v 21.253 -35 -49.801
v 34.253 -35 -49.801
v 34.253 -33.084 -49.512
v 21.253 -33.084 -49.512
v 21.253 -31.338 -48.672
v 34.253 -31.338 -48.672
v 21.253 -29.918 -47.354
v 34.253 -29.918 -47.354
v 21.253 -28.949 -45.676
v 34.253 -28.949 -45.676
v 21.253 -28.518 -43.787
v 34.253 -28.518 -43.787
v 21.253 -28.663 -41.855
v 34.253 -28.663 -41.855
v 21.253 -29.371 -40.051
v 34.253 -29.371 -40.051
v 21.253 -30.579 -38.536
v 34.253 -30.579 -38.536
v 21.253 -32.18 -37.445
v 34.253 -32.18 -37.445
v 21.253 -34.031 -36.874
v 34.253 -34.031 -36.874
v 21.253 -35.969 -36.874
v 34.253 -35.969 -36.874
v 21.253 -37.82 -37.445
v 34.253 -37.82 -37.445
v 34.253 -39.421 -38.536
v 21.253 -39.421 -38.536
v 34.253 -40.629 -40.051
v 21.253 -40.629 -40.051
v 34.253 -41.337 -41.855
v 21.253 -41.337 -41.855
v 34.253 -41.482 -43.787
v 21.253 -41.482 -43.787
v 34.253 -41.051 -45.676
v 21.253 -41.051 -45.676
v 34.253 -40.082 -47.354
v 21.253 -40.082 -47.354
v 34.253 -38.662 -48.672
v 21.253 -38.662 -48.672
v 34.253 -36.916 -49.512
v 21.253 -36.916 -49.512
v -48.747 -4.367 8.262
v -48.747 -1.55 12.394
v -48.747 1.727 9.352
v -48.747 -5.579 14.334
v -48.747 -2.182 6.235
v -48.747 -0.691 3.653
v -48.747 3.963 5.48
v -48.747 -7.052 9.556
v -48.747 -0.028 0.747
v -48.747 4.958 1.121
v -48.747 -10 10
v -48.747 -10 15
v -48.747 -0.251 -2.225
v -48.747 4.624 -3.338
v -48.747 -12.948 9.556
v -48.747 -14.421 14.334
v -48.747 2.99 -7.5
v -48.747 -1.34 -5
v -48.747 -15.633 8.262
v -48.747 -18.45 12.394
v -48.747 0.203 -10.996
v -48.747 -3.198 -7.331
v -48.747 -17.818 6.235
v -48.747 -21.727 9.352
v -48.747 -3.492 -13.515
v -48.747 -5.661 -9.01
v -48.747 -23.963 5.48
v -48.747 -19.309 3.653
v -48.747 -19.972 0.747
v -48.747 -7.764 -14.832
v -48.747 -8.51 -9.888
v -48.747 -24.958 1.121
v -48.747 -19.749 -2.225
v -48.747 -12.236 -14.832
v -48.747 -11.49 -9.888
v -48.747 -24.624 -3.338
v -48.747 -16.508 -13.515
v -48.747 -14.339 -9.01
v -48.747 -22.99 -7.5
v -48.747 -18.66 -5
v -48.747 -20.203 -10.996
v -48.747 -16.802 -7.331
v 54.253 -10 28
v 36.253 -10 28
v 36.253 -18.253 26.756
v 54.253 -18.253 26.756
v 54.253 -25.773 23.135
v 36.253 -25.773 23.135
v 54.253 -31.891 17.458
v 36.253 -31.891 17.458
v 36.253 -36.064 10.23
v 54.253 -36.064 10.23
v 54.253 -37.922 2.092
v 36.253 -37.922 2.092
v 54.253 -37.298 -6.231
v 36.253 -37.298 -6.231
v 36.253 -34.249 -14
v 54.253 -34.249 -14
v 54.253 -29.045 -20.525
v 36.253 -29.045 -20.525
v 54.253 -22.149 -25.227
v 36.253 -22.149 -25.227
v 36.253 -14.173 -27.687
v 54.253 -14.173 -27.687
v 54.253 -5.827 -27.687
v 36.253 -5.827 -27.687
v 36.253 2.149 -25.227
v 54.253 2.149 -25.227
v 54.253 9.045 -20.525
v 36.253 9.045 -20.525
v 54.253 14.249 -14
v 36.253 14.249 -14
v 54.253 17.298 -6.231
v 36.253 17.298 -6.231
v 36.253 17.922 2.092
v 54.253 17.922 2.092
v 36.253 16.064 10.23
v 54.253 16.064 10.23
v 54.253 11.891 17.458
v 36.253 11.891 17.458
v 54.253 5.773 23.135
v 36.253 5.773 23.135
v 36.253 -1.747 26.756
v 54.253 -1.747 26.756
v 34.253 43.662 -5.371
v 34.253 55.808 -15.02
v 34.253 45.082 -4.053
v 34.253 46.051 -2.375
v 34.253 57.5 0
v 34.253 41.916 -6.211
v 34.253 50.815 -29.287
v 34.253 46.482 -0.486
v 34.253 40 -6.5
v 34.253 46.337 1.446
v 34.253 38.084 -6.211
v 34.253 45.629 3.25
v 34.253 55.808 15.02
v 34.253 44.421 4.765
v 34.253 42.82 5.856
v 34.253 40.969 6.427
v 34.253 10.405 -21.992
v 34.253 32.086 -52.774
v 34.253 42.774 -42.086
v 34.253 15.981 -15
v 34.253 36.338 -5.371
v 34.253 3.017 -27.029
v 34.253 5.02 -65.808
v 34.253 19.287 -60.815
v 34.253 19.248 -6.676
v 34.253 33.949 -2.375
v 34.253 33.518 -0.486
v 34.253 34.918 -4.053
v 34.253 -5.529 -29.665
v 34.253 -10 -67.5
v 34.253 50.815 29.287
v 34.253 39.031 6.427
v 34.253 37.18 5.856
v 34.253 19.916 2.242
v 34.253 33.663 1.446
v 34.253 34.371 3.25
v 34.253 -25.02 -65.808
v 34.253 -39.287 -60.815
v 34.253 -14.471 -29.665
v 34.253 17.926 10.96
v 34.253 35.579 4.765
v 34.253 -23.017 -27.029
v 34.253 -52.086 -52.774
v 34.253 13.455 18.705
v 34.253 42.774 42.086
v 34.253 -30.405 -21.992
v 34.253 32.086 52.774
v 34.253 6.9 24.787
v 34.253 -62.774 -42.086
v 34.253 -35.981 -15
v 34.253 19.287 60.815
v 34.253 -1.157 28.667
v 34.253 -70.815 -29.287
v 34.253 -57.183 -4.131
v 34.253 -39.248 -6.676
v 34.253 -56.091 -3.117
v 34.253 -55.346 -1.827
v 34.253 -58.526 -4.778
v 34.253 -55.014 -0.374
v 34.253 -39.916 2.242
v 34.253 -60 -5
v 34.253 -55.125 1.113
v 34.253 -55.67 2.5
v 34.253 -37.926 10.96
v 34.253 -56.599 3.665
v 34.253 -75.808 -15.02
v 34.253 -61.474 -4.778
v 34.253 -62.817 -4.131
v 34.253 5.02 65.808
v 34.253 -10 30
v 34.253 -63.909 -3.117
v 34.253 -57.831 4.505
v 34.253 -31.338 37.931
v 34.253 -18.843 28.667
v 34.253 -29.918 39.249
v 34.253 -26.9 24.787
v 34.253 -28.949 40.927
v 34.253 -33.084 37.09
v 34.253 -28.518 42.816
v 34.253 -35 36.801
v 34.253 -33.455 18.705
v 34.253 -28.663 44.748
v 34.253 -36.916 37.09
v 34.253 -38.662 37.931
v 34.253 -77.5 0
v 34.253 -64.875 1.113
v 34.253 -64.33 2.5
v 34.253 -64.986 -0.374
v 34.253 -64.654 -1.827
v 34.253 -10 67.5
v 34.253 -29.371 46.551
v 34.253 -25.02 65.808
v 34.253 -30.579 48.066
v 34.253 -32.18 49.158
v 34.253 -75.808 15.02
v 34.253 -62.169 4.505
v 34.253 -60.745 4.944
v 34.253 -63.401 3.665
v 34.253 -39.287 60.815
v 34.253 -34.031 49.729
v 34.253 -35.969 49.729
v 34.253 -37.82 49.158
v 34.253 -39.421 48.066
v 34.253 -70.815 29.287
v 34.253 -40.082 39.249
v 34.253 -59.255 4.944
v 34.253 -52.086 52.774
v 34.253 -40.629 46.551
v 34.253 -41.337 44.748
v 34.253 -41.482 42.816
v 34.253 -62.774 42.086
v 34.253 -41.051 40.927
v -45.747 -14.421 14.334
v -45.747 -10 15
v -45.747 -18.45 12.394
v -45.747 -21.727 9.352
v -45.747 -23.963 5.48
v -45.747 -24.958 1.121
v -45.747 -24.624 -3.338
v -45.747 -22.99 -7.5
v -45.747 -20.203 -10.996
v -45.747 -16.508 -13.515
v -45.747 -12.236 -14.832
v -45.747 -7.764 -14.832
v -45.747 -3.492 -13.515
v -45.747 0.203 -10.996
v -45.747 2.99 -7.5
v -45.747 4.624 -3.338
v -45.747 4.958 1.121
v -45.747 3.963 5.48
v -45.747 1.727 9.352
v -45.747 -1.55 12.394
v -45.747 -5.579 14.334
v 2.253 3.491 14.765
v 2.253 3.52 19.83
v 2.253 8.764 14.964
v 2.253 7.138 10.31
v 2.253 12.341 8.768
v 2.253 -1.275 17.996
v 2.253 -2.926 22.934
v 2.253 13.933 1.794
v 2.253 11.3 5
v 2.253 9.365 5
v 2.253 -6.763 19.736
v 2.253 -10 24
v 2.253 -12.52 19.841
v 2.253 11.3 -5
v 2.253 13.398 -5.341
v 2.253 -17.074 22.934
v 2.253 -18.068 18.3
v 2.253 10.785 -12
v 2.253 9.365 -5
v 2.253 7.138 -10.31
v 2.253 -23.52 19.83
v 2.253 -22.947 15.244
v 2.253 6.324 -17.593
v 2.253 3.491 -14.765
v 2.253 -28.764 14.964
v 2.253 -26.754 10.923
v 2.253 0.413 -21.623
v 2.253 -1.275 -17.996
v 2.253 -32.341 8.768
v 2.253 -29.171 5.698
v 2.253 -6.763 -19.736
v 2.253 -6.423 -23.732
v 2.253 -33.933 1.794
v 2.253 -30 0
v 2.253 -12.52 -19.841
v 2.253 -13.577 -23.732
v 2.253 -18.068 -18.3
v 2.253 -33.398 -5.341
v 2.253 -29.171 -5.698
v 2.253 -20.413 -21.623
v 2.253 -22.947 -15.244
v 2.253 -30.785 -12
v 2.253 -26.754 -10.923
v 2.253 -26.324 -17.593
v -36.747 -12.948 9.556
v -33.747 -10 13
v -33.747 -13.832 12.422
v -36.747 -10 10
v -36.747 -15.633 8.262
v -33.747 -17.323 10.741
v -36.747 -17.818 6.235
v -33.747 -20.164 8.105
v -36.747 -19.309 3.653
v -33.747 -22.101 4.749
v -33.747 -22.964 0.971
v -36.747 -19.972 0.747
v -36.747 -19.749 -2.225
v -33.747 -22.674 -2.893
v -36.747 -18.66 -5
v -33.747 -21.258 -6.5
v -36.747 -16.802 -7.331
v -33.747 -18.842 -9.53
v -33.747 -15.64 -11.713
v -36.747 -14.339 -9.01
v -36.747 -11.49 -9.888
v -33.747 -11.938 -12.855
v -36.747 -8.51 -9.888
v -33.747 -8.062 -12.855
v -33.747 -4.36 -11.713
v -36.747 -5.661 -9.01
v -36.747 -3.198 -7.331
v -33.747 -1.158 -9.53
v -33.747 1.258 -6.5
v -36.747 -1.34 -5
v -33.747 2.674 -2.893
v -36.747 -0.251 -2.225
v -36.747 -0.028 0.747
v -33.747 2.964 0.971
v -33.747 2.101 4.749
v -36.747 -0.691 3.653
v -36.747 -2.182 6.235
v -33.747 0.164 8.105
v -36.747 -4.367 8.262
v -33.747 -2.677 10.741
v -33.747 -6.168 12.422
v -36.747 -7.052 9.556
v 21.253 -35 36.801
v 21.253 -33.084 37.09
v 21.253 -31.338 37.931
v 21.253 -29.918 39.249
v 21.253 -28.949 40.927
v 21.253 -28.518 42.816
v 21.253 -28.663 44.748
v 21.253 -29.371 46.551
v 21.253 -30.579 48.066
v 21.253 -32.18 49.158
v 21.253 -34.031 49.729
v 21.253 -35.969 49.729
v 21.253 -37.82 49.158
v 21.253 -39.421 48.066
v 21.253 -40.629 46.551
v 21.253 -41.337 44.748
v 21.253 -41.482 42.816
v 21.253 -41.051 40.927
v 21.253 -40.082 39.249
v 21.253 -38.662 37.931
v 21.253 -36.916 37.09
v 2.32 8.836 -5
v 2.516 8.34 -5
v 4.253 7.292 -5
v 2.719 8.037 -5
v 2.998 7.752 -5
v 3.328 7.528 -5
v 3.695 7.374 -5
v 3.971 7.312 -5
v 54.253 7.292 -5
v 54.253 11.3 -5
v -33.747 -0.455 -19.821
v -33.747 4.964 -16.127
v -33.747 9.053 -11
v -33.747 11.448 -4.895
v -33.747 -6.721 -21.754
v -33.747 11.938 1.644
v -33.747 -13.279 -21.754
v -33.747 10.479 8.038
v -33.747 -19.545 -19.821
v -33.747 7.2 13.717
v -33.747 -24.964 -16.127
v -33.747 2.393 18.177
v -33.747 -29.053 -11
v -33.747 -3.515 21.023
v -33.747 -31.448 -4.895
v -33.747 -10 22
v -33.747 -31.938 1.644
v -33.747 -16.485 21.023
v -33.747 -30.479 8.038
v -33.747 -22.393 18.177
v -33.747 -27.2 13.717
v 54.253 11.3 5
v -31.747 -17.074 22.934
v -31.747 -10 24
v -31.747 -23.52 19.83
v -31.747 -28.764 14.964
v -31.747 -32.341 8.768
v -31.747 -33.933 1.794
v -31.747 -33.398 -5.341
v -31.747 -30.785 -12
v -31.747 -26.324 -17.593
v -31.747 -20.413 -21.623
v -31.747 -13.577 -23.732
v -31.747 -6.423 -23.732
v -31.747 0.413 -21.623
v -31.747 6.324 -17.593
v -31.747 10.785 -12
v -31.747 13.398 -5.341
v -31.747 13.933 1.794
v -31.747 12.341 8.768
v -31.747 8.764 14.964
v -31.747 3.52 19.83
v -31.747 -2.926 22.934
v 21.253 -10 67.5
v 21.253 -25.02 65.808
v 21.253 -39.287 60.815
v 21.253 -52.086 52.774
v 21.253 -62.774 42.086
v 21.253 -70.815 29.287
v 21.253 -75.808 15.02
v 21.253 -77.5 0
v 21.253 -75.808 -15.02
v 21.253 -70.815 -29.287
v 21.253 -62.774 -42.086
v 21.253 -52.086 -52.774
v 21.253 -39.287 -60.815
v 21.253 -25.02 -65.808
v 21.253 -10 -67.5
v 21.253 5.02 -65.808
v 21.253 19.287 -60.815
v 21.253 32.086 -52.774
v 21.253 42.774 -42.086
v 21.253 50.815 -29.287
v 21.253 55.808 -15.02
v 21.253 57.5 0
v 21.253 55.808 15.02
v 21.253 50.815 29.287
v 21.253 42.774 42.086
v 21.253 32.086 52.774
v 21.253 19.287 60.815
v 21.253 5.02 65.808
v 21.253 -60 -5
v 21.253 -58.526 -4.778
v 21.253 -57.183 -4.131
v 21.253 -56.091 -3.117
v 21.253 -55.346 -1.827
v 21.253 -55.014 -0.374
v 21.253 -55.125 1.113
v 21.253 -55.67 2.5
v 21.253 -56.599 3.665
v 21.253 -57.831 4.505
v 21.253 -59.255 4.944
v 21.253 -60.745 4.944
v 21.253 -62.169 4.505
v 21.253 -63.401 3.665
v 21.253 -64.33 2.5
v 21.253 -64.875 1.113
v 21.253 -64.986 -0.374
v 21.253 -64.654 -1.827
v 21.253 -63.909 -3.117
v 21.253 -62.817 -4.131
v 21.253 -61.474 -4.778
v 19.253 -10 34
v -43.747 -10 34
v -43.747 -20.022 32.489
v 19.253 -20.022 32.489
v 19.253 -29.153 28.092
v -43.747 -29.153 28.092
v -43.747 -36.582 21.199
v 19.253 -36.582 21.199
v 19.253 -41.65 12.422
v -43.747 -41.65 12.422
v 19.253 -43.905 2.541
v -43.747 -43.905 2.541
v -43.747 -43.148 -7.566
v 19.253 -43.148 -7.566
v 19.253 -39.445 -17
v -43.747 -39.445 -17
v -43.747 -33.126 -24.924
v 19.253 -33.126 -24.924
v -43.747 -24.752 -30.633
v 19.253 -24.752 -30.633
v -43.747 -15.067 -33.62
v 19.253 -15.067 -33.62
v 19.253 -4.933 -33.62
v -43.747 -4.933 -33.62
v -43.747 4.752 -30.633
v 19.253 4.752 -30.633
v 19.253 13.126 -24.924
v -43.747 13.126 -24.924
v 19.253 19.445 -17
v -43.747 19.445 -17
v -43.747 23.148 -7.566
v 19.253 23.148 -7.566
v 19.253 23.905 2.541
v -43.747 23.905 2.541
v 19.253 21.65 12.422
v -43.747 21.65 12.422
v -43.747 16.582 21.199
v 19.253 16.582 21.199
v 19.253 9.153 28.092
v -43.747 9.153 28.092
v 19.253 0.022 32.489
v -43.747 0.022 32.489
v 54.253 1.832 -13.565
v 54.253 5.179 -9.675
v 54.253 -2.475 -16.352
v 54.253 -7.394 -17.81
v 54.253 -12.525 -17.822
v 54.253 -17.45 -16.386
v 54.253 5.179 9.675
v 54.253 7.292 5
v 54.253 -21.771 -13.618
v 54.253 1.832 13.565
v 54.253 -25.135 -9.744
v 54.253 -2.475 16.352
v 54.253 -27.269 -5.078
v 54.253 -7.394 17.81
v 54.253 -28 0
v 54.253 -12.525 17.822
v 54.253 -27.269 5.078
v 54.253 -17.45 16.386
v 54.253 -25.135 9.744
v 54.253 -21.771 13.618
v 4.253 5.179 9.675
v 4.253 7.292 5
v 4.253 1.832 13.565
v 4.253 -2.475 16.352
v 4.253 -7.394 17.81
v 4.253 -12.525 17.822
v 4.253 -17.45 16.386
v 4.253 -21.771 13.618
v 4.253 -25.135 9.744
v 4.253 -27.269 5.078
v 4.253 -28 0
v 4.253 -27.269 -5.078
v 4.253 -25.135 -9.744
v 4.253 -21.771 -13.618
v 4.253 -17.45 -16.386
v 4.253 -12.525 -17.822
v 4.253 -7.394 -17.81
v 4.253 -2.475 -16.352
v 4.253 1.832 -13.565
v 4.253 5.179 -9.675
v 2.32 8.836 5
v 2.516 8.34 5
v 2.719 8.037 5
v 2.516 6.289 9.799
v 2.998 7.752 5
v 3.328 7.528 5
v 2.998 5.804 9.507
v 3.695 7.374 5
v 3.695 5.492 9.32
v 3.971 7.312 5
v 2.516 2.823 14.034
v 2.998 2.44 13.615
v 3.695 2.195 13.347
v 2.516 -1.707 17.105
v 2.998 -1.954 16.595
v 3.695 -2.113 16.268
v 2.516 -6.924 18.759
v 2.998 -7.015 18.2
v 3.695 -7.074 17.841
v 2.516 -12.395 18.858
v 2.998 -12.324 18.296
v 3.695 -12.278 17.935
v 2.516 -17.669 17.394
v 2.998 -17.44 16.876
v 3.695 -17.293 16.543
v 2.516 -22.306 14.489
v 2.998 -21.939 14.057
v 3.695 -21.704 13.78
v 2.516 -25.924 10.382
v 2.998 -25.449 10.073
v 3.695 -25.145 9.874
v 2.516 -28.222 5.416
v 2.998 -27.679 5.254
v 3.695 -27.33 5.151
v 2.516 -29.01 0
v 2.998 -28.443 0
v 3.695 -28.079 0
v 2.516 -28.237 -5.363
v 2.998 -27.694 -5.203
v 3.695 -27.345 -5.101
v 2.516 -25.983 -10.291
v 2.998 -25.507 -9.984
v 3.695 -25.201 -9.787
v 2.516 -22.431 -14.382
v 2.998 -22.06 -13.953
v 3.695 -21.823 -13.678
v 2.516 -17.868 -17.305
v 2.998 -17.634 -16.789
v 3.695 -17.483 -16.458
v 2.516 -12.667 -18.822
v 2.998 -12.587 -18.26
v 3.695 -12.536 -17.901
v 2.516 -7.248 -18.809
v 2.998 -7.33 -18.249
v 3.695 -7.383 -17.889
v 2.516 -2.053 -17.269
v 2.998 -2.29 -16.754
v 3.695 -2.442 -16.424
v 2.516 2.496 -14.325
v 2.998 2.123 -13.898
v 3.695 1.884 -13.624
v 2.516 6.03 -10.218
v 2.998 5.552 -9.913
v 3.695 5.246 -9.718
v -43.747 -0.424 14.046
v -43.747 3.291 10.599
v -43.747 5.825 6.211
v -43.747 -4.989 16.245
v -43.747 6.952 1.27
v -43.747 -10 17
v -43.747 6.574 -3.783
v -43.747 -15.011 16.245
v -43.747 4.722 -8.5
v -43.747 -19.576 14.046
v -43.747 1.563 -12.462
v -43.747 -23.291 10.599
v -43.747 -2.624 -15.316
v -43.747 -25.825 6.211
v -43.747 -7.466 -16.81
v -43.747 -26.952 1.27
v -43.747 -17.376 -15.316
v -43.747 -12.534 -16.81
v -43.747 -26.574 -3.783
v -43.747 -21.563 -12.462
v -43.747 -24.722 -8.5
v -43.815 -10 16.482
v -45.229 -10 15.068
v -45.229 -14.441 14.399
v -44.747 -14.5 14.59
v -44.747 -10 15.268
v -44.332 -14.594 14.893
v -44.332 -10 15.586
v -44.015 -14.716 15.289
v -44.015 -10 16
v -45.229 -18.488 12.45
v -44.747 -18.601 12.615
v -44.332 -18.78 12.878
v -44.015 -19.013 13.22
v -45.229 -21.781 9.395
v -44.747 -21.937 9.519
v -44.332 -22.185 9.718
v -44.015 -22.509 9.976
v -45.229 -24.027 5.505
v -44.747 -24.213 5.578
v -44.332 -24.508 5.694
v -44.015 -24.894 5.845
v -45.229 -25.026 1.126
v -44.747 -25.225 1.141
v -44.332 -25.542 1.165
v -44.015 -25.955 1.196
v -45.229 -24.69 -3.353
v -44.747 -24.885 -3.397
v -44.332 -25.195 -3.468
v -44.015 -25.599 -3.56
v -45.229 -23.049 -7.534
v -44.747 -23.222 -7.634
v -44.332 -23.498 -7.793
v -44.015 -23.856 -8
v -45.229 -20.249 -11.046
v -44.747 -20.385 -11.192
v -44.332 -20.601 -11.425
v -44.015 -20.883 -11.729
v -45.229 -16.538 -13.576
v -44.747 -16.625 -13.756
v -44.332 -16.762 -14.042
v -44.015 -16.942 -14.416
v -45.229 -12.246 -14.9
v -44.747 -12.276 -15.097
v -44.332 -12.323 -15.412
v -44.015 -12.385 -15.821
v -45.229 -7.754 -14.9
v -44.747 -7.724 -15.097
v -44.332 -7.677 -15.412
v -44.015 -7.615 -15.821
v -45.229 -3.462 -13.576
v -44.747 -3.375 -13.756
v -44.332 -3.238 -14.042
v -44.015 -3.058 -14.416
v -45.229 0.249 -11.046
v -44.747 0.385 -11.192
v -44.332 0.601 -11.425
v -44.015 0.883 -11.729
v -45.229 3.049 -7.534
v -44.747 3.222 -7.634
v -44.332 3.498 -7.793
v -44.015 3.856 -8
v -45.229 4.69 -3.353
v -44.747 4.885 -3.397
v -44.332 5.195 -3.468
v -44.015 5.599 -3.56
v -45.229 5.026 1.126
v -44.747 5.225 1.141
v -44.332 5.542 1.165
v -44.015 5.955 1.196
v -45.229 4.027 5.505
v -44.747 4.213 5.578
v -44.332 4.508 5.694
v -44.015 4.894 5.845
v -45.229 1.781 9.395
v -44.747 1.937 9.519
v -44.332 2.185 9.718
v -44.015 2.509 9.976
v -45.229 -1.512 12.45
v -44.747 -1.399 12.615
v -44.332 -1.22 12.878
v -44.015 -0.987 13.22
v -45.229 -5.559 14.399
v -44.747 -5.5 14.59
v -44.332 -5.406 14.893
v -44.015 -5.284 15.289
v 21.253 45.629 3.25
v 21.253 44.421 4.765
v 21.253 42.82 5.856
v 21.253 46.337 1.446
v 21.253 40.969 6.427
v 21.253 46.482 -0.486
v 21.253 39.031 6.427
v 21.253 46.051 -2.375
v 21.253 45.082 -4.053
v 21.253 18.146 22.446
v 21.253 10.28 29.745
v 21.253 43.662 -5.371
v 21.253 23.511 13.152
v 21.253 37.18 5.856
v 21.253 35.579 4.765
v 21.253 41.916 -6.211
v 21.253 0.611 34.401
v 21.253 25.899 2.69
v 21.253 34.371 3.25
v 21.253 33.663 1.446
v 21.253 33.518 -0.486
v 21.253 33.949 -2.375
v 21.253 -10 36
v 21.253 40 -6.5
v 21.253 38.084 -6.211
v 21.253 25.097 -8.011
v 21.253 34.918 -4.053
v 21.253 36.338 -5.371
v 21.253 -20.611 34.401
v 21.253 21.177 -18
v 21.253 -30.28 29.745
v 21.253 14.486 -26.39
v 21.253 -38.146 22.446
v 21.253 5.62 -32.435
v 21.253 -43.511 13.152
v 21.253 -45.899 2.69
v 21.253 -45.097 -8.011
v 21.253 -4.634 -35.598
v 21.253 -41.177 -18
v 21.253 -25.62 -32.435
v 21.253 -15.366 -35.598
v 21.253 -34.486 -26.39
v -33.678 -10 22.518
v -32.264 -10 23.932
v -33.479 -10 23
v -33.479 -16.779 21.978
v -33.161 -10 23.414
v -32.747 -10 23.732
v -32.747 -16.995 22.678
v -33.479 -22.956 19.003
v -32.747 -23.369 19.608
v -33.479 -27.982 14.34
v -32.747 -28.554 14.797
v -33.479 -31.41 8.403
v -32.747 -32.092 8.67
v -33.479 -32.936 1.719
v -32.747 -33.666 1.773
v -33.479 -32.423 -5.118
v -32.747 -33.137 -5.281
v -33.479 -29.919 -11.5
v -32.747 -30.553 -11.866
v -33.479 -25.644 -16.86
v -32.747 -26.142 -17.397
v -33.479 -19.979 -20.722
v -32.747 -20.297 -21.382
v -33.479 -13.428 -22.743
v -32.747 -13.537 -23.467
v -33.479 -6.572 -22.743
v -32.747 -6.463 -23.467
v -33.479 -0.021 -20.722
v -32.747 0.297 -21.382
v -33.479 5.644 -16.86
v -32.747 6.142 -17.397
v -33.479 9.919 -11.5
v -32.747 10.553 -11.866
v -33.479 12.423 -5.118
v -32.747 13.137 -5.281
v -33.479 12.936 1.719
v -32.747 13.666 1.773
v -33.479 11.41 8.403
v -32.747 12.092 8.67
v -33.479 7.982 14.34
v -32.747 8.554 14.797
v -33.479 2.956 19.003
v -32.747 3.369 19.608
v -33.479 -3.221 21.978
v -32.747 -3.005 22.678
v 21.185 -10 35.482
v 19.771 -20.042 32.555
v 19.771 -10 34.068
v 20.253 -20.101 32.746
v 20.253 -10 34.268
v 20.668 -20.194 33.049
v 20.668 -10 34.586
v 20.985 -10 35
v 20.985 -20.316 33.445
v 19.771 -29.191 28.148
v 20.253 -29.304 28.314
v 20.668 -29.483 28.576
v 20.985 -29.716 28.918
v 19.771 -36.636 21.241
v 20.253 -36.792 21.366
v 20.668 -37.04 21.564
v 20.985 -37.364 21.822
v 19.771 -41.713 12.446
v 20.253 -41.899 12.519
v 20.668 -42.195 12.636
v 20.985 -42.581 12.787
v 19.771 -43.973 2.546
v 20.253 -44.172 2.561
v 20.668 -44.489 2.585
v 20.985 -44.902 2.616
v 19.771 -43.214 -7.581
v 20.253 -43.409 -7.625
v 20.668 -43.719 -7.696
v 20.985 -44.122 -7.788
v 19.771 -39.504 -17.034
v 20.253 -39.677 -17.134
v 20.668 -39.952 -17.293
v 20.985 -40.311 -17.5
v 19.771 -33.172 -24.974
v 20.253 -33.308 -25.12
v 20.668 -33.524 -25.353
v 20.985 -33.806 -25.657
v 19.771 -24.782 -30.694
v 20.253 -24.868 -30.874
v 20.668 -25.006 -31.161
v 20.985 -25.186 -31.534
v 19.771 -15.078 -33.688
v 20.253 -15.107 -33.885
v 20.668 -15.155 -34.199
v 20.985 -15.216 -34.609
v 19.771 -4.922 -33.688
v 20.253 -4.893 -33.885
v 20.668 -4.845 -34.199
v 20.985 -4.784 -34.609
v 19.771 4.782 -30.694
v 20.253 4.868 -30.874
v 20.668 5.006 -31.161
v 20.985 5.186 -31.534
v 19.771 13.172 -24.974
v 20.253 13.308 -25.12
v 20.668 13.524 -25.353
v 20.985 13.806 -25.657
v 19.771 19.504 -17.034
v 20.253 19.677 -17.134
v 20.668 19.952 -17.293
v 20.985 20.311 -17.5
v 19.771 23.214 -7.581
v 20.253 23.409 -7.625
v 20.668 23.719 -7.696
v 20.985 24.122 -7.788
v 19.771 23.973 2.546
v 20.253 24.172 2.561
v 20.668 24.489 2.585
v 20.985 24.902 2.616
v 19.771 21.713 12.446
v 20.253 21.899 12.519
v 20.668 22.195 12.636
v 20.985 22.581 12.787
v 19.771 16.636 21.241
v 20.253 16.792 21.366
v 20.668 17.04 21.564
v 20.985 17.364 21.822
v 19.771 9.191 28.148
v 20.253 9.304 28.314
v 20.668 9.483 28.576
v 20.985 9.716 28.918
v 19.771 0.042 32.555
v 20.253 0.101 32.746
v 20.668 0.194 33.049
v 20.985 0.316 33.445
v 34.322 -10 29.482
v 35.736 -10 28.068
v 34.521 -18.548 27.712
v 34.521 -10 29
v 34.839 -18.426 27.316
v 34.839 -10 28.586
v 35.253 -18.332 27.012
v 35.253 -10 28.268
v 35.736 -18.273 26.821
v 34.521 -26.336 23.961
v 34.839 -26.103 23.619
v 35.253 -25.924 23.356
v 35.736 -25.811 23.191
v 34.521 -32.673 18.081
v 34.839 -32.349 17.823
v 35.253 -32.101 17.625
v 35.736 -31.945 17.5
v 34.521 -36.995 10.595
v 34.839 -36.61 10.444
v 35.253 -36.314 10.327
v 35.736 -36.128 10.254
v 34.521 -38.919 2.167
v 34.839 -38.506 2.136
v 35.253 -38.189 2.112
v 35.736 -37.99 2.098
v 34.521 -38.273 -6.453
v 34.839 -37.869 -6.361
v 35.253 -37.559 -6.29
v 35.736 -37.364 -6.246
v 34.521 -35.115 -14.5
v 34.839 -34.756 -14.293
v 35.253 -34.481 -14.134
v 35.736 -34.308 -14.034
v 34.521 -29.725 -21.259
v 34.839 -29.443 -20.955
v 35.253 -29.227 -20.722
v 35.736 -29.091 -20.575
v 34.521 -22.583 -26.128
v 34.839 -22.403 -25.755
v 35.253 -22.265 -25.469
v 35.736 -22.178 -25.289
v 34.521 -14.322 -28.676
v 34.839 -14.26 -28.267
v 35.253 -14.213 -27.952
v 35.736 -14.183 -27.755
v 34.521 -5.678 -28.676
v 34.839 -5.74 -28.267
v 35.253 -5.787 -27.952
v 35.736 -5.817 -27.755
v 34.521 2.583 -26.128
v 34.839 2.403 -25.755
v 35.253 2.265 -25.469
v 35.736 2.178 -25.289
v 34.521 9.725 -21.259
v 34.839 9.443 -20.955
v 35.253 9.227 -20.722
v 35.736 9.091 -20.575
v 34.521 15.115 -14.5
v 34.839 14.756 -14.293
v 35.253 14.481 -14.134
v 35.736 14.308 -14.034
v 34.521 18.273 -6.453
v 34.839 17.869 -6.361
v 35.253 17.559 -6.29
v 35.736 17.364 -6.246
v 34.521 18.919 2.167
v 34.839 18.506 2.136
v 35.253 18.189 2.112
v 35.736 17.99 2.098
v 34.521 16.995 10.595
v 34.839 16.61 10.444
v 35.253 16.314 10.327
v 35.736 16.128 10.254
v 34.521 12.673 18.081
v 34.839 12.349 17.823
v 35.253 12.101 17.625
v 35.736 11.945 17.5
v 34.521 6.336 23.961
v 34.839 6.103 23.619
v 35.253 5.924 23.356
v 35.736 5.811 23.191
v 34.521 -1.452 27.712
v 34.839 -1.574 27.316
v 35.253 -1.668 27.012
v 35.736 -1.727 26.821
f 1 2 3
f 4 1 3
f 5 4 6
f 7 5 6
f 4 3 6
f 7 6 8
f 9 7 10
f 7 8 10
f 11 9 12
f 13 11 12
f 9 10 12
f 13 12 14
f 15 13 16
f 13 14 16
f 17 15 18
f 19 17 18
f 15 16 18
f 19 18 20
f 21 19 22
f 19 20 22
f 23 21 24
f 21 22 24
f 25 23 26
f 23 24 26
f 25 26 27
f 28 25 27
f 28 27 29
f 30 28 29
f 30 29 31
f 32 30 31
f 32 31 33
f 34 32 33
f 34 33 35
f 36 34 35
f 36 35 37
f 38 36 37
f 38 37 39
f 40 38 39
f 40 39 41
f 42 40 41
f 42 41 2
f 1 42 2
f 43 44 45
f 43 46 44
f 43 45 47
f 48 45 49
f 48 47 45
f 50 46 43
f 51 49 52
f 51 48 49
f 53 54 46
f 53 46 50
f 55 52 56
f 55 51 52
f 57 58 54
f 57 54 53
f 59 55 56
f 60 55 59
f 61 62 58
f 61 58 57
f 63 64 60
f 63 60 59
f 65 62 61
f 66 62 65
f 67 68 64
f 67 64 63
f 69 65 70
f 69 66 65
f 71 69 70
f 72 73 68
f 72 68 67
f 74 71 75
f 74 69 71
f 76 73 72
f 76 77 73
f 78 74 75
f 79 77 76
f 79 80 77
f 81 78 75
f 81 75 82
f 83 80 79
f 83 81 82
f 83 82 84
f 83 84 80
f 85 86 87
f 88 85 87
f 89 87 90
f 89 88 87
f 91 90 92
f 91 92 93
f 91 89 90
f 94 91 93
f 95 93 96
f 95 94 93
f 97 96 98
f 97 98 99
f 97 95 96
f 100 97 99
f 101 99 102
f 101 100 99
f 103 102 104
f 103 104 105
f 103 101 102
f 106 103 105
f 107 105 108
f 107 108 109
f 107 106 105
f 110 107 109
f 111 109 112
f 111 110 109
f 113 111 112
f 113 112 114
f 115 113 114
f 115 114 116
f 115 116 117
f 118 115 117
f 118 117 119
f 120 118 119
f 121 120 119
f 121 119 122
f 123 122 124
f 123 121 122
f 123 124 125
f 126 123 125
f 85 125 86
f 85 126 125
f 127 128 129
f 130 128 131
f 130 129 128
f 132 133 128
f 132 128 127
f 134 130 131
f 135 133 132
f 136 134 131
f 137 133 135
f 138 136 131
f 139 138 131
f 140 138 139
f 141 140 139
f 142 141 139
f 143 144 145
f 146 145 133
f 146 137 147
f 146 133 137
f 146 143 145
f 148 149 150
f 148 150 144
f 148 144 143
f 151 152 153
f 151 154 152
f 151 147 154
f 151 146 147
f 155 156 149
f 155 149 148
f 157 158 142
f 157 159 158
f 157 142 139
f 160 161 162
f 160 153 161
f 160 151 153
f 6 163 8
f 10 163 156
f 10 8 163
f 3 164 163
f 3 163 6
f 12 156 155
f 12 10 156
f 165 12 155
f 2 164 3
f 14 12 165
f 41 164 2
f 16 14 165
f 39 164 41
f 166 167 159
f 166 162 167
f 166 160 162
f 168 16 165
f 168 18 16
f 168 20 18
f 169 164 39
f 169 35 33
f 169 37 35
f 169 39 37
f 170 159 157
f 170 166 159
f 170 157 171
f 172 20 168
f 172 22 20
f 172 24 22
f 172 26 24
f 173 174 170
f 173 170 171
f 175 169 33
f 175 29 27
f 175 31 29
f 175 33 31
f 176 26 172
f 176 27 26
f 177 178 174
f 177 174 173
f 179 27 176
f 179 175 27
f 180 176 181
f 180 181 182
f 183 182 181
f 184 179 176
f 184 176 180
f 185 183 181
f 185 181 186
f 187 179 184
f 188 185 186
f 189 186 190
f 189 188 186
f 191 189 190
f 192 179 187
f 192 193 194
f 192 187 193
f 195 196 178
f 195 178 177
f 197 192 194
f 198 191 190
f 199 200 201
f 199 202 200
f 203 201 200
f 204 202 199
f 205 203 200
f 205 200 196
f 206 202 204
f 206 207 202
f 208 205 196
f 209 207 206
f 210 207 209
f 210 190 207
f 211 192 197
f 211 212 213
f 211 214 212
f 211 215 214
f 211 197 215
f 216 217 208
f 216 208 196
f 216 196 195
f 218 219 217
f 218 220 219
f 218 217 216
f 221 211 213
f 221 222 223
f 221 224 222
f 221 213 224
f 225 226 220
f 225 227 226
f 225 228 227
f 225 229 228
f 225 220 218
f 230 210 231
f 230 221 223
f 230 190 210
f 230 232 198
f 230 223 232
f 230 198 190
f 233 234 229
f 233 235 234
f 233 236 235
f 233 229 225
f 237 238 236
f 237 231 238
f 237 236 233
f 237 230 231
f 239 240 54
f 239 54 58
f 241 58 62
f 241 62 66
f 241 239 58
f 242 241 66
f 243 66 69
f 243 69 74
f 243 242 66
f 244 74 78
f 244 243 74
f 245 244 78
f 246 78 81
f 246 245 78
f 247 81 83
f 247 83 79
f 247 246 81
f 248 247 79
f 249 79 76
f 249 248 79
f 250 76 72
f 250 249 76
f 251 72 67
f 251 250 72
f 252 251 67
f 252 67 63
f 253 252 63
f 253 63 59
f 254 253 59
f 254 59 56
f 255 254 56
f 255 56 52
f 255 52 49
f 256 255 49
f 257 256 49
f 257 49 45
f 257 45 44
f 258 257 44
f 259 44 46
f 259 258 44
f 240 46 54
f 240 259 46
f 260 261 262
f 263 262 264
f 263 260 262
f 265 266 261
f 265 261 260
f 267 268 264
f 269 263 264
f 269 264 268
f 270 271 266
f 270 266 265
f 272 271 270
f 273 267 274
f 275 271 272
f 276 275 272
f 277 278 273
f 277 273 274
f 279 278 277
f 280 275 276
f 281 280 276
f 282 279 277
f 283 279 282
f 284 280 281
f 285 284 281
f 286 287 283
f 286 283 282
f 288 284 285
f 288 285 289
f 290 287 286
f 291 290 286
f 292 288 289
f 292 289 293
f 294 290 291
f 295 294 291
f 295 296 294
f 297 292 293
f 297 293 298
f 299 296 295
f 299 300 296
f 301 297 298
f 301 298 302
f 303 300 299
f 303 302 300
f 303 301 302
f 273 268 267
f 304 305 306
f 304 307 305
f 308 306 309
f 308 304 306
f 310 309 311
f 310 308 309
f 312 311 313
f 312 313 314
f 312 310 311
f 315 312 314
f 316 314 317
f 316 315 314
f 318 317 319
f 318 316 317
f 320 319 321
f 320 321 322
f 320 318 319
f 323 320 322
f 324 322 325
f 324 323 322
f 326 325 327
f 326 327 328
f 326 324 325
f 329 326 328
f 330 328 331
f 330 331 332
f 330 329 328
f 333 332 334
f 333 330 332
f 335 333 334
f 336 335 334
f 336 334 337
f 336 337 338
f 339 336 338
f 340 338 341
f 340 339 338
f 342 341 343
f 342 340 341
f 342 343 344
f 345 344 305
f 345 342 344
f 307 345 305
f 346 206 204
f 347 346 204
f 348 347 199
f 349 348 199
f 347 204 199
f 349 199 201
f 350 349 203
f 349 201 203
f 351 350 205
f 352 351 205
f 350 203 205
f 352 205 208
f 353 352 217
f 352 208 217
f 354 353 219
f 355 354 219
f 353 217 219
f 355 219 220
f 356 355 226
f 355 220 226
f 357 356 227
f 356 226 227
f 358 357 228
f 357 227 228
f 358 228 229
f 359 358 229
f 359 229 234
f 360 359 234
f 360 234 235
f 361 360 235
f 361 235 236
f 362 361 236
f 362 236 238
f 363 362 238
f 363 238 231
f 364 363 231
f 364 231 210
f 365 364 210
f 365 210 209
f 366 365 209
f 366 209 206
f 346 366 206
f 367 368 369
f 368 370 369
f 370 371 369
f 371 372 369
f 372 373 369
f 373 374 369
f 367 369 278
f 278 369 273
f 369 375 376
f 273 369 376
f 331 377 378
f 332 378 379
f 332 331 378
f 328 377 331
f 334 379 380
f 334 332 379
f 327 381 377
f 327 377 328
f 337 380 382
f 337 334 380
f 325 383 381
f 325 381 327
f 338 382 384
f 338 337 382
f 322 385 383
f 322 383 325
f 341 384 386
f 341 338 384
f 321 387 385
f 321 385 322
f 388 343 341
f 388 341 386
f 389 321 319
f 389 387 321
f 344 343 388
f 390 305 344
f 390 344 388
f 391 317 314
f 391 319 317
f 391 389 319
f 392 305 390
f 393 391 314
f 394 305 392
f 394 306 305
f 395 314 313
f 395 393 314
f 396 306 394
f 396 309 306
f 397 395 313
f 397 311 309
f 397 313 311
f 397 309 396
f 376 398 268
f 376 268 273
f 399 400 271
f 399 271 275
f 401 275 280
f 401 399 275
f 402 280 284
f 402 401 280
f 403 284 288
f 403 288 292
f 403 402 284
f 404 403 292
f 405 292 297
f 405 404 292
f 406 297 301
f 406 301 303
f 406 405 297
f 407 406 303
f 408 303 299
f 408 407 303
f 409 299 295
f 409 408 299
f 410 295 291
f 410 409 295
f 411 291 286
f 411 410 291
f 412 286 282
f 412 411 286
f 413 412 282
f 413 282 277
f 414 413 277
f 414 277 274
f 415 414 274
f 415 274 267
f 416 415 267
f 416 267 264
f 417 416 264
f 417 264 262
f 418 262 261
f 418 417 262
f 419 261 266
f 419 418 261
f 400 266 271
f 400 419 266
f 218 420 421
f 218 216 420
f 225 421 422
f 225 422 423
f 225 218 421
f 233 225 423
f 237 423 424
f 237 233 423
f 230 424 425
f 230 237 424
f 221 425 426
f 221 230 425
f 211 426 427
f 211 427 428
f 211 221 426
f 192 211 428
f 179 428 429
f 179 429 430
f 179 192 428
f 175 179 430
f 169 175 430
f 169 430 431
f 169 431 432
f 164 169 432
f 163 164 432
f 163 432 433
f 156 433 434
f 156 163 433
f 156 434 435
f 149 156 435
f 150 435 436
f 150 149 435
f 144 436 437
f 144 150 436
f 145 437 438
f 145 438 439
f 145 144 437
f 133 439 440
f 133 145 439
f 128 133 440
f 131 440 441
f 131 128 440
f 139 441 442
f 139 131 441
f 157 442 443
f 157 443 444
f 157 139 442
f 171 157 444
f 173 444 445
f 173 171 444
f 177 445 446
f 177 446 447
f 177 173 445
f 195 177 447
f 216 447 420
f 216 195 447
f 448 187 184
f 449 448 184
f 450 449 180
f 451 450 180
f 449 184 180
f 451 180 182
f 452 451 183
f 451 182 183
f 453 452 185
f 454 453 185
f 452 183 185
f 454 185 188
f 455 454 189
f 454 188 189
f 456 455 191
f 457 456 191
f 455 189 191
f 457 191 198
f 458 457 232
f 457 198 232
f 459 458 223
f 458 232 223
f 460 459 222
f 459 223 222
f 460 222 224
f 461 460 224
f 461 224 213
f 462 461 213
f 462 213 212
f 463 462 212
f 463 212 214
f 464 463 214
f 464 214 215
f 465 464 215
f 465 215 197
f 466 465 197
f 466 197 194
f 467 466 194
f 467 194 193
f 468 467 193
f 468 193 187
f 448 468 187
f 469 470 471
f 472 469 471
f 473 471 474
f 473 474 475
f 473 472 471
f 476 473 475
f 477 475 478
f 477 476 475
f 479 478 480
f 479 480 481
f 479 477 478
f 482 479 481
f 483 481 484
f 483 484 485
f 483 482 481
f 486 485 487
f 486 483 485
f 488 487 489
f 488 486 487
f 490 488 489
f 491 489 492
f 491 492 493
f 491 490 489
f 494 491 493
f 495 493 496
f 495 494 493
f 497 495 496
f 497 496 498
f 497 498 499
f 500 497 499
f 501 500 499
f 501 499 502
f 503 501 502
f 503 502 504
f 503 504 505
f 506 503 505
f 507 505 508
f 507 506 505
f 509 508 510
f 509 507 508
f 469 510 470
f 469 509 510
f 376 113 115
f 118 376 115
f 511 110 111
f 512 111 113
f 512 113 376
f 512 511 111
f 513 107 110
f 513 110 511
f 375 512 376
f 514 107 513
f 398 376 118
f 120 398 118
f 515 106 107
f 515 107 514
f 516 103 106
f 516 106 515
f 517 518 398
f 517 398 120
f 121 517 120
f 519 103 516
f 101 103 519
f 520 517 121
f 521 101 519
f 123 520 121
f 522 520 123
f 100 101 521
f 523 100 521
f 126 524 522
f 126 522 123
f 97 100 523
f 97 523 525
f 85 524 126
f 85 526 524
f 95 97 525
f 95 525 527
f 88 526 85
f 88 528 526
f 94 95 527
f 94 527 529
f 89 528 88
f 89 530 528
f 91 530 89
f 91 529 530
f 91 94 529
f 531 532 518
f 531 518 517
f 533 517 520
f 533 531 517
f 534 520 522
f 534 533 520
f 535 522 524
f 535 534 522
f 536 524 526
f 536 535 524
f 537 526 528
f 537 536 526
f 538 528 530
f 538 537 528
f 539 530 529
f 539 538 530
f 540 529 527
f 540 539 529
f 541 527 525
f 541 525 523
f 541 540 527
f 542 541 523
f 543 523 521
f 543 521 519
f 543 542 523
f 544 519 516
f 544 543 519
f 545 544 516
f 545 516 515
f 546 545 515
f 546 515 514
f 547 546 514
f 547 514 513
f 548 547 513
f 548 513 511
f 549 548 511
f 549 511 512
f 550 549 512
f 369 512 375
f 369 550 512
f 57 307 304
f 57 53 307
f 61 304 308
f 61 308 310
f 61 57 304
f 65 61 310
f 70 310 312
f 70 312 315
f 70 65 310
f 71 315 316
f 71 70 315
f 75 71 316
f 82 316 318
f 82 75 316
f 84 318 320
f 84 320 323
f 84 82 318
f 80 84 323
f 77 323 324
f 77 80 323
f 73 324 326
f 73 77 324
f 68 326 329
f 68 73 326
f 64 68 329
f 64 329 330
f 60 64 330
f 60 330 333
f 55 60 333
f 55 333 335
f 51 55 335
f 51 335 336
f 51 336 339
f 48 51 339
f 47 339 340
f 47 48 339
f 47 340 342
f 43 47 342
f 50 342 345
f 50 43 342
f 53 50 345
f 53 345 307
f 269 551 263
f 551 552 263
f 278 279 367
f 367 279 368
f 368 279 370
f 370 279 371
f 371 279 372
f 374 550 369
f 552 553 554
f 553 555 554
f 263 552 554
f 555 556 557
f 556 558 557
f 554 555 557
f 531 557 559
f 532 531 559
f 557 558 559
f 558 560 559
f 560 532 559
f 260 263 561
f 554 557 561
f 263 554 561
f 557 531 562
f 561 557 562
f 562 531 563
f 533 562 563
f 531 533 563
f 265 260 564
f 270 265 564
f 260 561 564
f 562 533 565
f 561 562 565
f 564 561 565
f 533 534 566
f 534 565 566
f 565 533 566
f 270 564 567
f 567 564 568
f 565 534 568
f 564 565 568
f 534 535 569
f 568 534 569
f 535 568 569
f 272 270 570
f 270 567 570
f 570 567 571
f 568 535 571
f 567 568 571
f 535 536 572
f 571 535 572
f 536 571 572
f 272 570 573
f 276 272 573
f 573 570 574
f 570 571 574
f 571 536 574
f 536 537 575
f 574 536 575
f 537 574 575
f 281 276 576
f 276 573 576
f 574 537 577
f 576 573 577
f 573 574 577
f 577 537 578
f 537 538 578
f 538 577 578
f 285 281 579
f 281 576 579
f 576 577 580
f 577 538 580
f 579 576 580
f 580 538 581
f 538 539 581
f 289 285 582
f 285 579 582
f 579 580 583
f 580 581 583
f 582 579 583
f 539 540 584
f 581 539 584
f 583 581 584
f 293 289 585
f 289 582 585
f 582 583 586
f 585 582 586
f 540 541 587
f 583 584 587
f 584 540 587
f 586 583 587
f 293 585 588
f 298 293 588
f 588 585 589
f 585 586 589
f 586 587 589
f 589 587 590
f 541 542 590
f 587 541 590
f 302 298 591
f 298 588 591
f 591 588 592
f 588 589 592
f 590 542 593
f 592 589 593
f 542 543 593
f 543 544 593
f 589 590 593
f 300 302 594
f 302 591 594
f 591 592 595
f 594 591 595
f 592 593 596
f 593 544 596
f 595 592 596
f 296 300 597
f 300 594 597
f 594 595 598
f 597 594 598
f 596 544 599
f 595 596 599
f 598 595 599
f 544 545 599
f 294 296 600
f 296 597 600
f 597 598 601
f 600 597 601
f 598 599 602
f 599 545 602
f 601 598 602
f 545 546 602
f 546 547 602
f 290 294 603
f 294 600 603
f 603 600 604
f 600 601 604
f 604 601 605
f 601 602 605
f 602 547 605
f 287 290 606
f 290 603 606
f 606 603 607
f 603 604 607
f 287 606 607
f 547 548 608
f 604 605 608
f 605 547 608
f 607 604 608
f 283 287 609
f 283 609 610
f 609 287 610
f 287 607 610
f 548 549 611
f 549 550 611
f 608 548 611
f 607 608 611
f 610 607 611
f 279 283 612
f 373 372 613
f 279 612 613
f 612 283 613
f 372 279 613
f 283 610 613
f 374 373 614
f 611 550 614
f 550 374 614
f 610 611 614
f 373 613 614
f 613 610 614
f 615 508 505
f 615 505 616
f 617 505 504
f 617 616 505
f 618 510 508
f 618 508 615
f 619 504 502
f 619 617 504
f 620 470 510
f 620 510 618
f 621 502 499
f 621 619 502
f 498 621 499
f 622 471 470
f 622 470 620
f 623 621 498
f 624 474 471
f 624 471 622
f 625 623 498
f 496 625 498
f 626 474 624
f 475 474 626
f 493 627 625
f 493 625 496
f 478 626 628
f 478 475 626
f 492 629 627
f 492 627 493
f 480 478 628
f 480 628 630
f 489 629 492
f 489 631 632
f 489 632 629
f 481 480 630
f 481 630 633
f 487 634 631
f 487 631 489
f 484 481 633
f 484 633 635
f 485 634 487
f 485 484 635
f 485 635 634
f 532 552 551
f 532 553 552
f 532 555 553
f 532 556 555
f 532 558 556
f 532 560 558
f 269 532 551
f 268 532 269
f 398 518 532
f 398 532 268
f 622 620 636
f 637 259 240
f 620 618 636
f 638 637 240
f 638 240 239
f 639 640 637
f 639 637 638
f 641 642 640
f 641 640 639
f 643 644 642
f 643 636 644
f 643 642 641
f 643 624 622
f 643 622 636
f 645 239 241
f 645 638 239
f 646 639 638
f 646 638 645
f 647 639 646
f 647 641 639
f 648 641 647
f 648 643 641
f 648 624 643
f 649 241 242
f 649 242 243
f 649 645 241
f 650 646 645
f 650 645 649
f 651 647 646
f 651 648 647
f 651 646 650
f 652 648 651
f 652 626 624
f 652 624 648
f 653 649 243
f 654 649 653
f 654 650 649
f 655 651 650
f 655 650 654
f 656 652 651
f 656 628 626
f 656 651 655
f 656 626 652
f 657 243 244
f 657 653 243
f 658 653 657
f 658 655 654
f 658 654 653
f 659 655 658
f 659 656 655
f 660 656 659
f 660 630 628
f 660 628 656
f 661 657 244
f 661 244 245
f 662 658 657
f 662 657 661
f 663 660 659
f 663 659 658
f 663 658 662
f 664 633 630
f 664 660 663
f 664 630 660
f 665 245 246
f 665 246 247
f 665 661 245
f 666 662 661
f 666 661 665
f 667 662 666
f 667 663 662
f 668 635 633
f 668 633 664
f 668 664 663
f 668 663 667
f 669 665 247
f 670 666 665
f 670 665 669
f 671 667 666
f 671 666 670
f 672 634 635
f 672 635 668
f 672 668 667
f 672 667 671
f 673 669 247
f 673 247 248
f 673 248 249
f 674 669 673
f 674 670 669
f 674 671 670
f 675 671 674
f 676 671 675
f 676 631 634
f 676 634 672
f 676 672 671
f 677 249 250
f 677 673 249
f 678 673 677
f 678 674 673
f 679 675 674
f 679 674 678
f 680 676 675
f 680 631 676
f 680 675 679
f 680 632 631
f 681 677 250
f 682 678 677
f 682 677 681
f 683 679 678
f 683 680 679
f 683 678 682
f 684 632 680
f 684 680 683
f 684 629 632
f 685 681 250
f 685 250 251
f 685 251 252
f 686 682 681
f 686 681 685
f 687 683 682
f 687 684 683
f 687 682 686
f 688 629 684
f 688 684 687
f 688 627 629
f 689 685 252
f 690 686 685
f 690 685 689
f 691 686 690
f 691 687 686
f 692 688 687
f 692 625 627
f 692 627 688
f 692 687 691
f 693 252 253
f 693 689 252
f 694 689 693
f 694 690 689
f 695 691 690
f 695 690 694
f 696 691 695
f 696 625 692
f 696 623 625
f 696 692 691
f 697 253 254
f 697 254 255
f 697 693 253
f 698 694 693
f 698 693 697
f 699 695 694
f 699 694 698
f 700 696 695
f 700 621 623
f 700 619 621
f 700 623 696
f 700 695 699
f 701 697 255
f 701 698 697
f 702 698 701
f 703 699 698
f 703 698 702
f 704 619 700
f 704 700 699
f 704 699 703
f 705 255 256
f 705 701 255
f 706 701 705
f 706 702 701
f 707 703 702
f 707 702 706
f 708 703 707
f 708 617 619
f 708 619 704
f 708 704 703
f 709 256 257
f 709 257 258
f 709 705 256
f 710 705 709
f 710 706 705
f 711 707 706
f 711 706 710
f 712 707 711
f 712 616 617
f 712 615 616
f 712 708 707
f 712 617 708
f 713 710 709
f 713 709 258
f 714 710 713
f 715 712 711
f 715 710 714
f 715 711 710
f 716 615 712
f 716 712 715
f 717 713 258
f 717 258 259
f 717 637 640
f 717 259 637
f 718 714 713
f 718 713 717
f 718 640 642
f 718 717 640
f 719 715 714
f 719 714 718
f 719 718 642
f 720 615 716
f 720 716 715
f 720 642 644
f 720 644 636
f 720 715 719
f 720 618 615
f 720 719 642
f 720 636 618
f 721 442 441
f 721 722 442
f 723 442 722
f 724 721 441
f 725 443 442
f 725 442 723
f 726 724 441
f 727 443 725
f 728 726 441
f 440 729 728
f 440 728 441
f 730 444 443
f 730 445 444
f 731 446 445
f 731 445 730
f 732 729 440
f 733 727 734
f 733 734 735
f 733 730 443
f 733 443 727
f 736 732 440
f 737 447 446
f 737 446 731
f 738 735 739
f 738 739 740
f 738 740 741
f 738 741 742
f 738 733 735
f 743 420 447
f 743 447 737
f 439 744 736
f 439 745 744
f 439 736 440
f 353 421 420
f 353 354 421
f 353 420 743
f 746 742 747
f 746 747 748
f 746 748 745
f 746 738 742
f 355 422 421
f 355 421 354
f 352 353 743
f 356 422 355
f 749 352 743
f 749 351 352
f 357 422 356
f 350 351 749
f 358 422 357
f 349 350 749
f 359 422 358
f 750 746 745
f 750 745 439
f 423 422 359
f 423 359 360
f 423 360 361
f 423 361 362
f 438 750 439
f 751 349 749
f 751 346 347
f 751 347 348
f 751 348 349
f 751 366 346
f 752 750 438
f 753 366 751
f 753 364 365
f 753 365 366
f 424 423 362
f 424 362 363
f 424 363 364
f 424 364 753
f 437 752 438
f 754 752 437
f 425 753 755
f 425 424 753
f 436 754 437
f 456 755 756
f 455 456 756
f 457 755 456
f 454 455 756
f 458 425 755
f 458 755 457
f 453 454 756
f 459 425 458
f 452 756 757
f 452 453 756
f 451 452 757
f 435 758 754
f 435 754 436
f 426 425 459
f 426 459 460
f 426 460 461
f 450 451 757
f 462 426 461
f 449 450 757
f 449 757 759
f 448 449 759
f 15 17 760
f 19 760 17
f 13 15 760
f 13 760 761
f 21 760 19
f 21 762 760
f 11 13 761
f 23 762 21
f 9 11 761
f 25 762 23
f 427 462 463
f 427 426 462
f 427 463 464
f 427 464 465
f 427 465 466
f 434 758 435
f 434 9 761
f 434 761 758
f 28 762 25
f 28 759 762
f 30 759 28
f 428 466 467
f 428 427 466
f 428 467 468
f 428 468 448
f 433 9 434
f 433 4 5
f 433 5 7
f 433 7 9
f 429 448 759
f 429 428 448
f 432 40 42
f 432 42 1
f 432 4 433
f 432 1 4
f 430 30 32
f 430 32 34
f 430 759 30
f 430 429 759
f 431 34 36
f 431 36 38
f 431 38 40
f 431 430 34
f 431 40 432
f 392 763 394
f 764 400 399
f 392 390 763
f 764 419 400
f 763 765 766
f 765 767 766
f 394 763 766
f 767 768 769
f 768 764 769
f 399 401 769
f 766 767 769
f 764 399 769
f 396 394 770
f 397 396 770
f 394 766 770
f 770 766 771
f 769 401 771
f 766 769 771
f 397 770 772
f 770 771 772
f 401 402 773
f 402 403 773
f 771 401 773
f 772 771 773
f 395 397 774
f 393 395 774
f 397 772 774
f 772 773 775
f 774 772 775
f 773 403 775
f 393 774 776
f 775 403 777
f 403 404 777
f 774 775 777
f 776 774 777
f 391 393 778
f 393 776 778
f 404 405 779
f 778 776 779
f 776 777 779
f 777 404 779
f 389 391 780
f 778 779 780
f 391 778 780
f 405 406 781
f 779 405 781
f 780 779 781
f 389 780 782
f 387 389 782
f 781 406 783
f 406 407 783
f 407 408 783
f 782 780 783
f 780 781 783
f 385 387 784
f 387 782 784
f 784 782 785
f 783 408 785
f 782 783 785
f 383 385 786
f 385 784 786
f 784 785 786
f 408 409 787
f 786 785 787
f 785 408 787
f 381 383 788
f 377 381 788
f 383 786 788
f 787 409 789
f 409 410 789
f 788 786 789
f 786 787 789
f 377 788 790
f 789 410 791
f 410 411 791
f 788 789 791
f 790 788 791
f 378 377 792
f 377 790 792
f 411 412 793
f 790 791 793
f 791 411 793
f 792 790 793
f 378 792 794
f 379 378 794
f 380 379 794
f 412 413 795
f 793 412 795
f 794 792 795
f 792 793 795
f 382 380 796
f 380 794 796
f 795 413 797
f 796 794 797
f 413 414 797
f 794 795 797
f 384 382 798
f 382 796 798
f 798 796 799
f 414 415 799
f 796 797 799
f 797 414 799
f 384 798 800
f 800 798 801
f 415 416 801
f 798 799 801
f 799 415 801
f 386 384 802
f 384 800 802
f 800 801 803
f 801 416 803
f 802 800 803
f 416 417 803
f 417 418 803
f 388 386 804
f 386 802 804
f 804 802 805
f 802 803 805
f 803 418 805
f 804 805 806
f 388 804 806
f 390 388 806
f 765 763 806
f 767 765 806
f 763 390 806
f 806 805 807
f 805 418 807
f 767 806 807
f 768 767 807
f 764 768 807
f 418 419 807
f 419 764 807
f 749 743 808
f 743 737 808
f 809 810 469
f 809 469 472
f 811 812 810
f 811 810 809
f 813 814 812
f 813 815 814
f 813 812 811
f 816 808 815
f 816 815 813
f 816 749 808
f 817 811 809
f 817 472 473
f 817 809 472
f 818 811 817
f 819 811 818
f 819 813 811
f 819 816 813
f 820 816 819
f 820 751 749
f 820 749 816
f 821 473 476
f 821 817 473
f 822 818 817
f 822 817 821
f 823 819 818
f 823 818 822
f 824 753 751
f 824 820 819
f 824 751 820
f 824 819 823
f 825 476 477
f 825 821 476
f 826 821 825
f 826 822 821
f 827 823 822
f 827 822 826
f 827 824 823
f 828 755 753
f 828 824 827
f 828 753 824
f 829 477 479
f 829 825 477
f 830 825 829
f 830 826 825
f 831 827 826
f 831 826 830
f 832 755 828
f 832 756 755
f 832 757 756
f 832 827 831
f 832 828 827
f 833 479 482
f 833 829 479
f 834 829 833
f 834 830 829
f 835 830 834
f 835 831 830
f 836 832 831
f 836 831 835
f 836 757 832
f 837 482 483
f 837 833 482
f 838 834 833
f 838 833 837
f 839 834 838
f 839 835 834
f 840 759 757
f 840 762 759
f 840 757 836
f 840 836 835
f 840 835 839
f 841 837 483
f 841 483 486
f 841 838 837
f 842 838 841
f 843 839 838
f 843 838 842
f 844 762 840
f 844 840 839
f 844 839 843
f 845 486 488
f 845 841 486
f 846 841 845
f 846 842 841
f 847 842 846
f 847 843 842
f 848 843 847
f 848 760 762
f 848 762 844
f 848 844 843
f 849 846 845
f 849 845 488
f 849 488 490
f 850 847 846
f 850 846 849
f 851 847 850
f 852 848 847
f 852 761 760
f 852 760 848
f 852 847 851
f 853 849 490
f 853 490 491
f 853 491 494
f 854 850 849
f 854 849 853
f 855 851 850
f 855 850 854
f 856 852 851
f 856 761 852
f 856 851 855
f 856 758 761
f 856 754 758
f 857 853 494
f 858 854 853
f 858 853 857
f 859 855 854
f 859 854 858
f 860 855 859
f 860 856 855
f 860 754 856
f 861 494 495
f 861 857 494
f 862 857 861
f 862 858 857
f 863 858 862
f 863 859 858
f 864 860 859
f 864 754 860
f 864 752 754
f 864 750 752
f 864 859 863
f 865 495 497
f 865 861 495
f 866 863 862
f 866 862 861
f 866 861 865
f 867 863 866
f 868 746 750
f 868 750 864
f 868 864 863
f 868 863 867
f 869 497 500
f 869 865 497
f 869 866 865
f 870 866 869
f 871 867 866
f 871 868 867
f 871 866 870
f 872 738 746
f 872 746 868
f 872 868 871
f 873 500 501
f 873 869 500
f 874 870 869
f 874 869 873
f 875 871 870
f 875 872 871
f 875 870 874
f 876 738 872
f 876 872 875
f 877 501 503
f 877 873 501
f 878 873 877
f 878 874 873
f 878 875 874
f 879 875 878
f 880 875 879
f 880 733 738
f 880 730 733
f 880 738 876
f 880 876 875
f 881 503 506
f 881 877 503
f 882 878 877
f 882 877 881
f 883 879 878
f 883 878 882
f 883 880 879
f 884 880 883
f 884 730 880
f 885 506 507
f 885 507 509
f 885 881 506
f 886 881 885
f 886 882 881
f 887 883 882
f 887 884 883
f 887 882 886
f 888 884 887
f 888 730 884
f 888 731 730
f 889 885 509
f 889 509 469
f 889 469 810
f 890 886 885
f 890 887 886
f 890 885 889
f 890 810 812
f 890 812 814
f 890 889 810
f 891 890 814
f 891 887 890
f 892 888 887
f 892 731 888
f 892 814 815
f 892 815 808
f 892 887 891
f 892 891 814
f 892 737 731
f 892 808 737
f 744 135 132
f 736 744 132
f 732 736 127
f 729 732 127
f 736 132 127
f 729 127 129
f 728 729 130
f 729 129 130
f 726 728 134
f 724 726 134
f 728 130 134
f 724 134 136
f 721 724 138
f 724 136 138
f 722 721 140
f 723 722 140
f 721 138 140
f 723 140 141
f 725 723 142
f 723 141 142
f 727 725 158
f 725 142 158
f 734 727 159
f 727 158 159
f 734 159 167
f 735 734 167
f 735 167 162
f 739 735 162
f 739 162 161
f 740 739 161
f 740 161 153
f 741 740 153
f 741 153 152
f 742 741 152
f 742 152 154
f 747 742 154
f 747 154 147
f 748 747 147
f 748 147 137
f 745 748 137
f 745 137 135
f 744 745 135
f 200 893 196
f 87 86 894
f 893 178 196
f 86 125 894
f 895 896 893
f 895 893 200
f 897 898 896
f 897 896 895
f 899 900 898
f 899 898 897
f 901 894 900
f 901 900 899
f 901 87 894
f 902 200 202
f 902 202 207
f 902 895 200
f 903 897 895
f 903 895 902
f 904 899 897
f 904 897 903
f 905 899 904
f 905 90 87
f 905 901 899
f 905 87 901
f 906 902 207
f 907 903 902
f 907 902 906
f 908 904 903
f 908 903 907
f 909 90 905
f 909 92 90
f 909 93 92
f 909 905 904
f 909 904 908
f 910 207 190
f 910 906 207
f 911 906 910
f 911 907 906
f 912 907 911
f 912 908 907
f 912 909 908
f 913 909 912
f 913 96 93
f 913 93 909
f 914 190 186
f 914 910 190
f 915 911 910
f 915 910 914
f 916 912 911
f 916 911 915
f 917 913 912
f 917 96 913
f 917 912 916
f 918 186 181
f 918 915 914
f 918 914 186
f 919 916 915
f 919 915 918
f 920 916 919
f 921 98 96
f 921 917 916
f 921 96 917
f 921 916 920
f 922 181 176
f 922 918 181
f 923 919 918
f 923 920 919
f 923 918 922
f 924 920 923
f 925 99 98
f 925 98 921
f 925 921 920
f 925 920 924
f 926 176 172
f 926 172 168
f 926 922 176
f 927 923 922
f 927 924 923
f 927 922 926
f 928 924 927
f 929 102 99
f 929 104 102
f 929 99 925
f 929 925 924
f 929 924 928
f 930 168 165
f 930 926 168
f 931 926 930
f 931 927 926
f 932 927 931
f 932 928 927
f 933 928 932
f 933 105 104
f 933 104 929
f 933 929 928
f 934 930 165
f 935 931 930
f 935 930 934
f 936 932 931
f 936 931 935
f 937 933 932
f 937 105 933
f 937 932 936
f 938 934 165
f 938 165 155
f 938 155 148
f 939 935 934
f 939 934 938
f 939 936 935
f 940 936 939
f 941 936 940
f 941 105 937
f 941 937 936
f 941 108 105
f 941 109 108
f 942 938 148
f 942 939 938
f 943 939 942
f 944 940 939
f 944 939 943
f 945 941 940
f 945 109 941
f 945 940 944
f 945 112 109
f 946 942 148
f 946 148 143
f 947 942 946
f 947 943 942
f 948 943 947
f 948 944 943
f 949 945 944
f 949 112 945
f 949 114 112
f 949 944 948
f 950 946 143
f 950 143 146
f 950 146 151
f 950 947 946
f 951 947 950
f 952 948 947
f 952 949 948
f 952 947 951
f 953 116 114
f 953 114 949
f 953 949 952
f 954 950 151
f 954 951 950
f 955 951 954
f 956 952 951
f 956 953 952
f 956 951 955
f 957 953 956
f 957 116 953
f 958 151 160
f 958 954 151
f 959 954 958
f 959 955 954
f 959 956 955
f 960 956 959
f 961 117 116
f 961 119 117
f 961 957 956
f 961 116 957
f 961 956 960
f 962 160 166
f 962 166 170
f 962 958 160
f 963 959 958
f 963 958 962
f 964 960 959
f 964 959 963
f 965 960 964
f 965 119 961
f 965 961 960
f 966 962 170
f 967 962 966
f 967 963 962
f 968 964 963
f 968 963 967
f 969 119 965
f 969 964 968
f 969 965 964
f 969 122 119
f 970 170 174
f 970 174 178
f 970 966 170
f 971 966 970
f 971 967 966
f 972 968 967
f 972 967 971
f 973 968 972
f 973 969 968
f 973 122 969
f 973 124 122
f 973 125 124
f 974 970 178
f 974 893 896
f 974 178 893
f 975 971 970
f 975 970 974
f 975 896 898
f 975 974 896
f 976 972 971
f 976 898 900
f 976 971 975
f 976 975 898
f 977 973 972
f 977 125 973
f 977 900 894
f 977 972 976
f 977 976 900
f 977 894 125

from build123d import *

# Parameters (mm, degrees)
FILLET1_R          = 2
FILLET2_R          = 2
SKETCH2_W          = 10
SKETCH2_H          = 6.6
CUT_EXTRUDE1_DEPTH = 52
SKETCH3_R          = 6.5
SKETCH3_R_2        = 5
CUT_EXTRUDE2_DEPTH = 52


with BuildPart() as part:
    # Sketch1 → Revolve1 (revolve)
    with BuildSketch(Plane.XY, mode=Mode.PRIVATE) as revolve1_sk:
        Polygon((-48.746583118, 0), (-48.746583118, 5), (-43.746583118, 5), (-43.746583118, 24), (21.253416882, 24), (21.253416882, 57.5), (34.253416882, 57.5), (34.253416882, 18), (54.253416882, 18), (54.253416882, 8), (2.253416882, 8), (2.253416882, 14), (-33.746583118, 14), (-33.746583118, 3), (-36.746583118, 0), align=None)
    revolve(revolve1_sk.sketch.rotate(Axis((-48.746583118, -10, 0), (1, 0, 0)), 90), axis=Axis((-48.746583118, -10, 0), (1, 0, 0)))

    # Fillet1
    fillet1_edges = [part.edges().sort_by_distance(p)[0] for p in [
        (-43.746583118, -10, -15),
        (21.253416882, -10, -34),
        (34.253416882, -10, -28),
    ]]
    fillet(fillet1_edges, radius=FILLET1_R)

    # Fillet2
    fillet2_edges = [part.edges().sort_by_distance(p)[0] for p in [
        (2.253416882, -10, -18),
        (-33.746583118, -10, -24),
    ]]
    fillet(fillet2_edges, radius=FILLET2_R)

    # Sketch2 → Cut-Extrude1 (cut)
    with BuildSketch(Plane(origin=(54.253416882, 0, 0), x_dir=(0, 0, -1), z_dir=(1, 0, 0))):
        with Locations((0, 8)):
            Rectangle(SKETCH2_W, SKETCH2_H)
    extrude(amount=-CUT_EXTRUDE1_DEPTH, mode=Mode.SUBTRACT)

    # Sketch3 → Cut-Extrude2 (cut)
    with BuildSketch(Plane(origin=(34.253416882, 0, 0), x_dir=(0, 0, -1), z_dir=(1, 0, 0))):
        with Locations((0, 40)):
            Circle(SKETCH3_R)
        with Locations((43.301270189, -35)):
            Circle(SKETCH3_R)
        with Locations((-43.301270189, -35)):
            Circle(SKETCH3_R)
        with Locations((0, -60)):
            Circle(SKETCH3_R_2)
    extrude(amount=-CUT_EXTRUDE2_DEPTH, mode=Mode.SUBTRACT)


solid = part.part
